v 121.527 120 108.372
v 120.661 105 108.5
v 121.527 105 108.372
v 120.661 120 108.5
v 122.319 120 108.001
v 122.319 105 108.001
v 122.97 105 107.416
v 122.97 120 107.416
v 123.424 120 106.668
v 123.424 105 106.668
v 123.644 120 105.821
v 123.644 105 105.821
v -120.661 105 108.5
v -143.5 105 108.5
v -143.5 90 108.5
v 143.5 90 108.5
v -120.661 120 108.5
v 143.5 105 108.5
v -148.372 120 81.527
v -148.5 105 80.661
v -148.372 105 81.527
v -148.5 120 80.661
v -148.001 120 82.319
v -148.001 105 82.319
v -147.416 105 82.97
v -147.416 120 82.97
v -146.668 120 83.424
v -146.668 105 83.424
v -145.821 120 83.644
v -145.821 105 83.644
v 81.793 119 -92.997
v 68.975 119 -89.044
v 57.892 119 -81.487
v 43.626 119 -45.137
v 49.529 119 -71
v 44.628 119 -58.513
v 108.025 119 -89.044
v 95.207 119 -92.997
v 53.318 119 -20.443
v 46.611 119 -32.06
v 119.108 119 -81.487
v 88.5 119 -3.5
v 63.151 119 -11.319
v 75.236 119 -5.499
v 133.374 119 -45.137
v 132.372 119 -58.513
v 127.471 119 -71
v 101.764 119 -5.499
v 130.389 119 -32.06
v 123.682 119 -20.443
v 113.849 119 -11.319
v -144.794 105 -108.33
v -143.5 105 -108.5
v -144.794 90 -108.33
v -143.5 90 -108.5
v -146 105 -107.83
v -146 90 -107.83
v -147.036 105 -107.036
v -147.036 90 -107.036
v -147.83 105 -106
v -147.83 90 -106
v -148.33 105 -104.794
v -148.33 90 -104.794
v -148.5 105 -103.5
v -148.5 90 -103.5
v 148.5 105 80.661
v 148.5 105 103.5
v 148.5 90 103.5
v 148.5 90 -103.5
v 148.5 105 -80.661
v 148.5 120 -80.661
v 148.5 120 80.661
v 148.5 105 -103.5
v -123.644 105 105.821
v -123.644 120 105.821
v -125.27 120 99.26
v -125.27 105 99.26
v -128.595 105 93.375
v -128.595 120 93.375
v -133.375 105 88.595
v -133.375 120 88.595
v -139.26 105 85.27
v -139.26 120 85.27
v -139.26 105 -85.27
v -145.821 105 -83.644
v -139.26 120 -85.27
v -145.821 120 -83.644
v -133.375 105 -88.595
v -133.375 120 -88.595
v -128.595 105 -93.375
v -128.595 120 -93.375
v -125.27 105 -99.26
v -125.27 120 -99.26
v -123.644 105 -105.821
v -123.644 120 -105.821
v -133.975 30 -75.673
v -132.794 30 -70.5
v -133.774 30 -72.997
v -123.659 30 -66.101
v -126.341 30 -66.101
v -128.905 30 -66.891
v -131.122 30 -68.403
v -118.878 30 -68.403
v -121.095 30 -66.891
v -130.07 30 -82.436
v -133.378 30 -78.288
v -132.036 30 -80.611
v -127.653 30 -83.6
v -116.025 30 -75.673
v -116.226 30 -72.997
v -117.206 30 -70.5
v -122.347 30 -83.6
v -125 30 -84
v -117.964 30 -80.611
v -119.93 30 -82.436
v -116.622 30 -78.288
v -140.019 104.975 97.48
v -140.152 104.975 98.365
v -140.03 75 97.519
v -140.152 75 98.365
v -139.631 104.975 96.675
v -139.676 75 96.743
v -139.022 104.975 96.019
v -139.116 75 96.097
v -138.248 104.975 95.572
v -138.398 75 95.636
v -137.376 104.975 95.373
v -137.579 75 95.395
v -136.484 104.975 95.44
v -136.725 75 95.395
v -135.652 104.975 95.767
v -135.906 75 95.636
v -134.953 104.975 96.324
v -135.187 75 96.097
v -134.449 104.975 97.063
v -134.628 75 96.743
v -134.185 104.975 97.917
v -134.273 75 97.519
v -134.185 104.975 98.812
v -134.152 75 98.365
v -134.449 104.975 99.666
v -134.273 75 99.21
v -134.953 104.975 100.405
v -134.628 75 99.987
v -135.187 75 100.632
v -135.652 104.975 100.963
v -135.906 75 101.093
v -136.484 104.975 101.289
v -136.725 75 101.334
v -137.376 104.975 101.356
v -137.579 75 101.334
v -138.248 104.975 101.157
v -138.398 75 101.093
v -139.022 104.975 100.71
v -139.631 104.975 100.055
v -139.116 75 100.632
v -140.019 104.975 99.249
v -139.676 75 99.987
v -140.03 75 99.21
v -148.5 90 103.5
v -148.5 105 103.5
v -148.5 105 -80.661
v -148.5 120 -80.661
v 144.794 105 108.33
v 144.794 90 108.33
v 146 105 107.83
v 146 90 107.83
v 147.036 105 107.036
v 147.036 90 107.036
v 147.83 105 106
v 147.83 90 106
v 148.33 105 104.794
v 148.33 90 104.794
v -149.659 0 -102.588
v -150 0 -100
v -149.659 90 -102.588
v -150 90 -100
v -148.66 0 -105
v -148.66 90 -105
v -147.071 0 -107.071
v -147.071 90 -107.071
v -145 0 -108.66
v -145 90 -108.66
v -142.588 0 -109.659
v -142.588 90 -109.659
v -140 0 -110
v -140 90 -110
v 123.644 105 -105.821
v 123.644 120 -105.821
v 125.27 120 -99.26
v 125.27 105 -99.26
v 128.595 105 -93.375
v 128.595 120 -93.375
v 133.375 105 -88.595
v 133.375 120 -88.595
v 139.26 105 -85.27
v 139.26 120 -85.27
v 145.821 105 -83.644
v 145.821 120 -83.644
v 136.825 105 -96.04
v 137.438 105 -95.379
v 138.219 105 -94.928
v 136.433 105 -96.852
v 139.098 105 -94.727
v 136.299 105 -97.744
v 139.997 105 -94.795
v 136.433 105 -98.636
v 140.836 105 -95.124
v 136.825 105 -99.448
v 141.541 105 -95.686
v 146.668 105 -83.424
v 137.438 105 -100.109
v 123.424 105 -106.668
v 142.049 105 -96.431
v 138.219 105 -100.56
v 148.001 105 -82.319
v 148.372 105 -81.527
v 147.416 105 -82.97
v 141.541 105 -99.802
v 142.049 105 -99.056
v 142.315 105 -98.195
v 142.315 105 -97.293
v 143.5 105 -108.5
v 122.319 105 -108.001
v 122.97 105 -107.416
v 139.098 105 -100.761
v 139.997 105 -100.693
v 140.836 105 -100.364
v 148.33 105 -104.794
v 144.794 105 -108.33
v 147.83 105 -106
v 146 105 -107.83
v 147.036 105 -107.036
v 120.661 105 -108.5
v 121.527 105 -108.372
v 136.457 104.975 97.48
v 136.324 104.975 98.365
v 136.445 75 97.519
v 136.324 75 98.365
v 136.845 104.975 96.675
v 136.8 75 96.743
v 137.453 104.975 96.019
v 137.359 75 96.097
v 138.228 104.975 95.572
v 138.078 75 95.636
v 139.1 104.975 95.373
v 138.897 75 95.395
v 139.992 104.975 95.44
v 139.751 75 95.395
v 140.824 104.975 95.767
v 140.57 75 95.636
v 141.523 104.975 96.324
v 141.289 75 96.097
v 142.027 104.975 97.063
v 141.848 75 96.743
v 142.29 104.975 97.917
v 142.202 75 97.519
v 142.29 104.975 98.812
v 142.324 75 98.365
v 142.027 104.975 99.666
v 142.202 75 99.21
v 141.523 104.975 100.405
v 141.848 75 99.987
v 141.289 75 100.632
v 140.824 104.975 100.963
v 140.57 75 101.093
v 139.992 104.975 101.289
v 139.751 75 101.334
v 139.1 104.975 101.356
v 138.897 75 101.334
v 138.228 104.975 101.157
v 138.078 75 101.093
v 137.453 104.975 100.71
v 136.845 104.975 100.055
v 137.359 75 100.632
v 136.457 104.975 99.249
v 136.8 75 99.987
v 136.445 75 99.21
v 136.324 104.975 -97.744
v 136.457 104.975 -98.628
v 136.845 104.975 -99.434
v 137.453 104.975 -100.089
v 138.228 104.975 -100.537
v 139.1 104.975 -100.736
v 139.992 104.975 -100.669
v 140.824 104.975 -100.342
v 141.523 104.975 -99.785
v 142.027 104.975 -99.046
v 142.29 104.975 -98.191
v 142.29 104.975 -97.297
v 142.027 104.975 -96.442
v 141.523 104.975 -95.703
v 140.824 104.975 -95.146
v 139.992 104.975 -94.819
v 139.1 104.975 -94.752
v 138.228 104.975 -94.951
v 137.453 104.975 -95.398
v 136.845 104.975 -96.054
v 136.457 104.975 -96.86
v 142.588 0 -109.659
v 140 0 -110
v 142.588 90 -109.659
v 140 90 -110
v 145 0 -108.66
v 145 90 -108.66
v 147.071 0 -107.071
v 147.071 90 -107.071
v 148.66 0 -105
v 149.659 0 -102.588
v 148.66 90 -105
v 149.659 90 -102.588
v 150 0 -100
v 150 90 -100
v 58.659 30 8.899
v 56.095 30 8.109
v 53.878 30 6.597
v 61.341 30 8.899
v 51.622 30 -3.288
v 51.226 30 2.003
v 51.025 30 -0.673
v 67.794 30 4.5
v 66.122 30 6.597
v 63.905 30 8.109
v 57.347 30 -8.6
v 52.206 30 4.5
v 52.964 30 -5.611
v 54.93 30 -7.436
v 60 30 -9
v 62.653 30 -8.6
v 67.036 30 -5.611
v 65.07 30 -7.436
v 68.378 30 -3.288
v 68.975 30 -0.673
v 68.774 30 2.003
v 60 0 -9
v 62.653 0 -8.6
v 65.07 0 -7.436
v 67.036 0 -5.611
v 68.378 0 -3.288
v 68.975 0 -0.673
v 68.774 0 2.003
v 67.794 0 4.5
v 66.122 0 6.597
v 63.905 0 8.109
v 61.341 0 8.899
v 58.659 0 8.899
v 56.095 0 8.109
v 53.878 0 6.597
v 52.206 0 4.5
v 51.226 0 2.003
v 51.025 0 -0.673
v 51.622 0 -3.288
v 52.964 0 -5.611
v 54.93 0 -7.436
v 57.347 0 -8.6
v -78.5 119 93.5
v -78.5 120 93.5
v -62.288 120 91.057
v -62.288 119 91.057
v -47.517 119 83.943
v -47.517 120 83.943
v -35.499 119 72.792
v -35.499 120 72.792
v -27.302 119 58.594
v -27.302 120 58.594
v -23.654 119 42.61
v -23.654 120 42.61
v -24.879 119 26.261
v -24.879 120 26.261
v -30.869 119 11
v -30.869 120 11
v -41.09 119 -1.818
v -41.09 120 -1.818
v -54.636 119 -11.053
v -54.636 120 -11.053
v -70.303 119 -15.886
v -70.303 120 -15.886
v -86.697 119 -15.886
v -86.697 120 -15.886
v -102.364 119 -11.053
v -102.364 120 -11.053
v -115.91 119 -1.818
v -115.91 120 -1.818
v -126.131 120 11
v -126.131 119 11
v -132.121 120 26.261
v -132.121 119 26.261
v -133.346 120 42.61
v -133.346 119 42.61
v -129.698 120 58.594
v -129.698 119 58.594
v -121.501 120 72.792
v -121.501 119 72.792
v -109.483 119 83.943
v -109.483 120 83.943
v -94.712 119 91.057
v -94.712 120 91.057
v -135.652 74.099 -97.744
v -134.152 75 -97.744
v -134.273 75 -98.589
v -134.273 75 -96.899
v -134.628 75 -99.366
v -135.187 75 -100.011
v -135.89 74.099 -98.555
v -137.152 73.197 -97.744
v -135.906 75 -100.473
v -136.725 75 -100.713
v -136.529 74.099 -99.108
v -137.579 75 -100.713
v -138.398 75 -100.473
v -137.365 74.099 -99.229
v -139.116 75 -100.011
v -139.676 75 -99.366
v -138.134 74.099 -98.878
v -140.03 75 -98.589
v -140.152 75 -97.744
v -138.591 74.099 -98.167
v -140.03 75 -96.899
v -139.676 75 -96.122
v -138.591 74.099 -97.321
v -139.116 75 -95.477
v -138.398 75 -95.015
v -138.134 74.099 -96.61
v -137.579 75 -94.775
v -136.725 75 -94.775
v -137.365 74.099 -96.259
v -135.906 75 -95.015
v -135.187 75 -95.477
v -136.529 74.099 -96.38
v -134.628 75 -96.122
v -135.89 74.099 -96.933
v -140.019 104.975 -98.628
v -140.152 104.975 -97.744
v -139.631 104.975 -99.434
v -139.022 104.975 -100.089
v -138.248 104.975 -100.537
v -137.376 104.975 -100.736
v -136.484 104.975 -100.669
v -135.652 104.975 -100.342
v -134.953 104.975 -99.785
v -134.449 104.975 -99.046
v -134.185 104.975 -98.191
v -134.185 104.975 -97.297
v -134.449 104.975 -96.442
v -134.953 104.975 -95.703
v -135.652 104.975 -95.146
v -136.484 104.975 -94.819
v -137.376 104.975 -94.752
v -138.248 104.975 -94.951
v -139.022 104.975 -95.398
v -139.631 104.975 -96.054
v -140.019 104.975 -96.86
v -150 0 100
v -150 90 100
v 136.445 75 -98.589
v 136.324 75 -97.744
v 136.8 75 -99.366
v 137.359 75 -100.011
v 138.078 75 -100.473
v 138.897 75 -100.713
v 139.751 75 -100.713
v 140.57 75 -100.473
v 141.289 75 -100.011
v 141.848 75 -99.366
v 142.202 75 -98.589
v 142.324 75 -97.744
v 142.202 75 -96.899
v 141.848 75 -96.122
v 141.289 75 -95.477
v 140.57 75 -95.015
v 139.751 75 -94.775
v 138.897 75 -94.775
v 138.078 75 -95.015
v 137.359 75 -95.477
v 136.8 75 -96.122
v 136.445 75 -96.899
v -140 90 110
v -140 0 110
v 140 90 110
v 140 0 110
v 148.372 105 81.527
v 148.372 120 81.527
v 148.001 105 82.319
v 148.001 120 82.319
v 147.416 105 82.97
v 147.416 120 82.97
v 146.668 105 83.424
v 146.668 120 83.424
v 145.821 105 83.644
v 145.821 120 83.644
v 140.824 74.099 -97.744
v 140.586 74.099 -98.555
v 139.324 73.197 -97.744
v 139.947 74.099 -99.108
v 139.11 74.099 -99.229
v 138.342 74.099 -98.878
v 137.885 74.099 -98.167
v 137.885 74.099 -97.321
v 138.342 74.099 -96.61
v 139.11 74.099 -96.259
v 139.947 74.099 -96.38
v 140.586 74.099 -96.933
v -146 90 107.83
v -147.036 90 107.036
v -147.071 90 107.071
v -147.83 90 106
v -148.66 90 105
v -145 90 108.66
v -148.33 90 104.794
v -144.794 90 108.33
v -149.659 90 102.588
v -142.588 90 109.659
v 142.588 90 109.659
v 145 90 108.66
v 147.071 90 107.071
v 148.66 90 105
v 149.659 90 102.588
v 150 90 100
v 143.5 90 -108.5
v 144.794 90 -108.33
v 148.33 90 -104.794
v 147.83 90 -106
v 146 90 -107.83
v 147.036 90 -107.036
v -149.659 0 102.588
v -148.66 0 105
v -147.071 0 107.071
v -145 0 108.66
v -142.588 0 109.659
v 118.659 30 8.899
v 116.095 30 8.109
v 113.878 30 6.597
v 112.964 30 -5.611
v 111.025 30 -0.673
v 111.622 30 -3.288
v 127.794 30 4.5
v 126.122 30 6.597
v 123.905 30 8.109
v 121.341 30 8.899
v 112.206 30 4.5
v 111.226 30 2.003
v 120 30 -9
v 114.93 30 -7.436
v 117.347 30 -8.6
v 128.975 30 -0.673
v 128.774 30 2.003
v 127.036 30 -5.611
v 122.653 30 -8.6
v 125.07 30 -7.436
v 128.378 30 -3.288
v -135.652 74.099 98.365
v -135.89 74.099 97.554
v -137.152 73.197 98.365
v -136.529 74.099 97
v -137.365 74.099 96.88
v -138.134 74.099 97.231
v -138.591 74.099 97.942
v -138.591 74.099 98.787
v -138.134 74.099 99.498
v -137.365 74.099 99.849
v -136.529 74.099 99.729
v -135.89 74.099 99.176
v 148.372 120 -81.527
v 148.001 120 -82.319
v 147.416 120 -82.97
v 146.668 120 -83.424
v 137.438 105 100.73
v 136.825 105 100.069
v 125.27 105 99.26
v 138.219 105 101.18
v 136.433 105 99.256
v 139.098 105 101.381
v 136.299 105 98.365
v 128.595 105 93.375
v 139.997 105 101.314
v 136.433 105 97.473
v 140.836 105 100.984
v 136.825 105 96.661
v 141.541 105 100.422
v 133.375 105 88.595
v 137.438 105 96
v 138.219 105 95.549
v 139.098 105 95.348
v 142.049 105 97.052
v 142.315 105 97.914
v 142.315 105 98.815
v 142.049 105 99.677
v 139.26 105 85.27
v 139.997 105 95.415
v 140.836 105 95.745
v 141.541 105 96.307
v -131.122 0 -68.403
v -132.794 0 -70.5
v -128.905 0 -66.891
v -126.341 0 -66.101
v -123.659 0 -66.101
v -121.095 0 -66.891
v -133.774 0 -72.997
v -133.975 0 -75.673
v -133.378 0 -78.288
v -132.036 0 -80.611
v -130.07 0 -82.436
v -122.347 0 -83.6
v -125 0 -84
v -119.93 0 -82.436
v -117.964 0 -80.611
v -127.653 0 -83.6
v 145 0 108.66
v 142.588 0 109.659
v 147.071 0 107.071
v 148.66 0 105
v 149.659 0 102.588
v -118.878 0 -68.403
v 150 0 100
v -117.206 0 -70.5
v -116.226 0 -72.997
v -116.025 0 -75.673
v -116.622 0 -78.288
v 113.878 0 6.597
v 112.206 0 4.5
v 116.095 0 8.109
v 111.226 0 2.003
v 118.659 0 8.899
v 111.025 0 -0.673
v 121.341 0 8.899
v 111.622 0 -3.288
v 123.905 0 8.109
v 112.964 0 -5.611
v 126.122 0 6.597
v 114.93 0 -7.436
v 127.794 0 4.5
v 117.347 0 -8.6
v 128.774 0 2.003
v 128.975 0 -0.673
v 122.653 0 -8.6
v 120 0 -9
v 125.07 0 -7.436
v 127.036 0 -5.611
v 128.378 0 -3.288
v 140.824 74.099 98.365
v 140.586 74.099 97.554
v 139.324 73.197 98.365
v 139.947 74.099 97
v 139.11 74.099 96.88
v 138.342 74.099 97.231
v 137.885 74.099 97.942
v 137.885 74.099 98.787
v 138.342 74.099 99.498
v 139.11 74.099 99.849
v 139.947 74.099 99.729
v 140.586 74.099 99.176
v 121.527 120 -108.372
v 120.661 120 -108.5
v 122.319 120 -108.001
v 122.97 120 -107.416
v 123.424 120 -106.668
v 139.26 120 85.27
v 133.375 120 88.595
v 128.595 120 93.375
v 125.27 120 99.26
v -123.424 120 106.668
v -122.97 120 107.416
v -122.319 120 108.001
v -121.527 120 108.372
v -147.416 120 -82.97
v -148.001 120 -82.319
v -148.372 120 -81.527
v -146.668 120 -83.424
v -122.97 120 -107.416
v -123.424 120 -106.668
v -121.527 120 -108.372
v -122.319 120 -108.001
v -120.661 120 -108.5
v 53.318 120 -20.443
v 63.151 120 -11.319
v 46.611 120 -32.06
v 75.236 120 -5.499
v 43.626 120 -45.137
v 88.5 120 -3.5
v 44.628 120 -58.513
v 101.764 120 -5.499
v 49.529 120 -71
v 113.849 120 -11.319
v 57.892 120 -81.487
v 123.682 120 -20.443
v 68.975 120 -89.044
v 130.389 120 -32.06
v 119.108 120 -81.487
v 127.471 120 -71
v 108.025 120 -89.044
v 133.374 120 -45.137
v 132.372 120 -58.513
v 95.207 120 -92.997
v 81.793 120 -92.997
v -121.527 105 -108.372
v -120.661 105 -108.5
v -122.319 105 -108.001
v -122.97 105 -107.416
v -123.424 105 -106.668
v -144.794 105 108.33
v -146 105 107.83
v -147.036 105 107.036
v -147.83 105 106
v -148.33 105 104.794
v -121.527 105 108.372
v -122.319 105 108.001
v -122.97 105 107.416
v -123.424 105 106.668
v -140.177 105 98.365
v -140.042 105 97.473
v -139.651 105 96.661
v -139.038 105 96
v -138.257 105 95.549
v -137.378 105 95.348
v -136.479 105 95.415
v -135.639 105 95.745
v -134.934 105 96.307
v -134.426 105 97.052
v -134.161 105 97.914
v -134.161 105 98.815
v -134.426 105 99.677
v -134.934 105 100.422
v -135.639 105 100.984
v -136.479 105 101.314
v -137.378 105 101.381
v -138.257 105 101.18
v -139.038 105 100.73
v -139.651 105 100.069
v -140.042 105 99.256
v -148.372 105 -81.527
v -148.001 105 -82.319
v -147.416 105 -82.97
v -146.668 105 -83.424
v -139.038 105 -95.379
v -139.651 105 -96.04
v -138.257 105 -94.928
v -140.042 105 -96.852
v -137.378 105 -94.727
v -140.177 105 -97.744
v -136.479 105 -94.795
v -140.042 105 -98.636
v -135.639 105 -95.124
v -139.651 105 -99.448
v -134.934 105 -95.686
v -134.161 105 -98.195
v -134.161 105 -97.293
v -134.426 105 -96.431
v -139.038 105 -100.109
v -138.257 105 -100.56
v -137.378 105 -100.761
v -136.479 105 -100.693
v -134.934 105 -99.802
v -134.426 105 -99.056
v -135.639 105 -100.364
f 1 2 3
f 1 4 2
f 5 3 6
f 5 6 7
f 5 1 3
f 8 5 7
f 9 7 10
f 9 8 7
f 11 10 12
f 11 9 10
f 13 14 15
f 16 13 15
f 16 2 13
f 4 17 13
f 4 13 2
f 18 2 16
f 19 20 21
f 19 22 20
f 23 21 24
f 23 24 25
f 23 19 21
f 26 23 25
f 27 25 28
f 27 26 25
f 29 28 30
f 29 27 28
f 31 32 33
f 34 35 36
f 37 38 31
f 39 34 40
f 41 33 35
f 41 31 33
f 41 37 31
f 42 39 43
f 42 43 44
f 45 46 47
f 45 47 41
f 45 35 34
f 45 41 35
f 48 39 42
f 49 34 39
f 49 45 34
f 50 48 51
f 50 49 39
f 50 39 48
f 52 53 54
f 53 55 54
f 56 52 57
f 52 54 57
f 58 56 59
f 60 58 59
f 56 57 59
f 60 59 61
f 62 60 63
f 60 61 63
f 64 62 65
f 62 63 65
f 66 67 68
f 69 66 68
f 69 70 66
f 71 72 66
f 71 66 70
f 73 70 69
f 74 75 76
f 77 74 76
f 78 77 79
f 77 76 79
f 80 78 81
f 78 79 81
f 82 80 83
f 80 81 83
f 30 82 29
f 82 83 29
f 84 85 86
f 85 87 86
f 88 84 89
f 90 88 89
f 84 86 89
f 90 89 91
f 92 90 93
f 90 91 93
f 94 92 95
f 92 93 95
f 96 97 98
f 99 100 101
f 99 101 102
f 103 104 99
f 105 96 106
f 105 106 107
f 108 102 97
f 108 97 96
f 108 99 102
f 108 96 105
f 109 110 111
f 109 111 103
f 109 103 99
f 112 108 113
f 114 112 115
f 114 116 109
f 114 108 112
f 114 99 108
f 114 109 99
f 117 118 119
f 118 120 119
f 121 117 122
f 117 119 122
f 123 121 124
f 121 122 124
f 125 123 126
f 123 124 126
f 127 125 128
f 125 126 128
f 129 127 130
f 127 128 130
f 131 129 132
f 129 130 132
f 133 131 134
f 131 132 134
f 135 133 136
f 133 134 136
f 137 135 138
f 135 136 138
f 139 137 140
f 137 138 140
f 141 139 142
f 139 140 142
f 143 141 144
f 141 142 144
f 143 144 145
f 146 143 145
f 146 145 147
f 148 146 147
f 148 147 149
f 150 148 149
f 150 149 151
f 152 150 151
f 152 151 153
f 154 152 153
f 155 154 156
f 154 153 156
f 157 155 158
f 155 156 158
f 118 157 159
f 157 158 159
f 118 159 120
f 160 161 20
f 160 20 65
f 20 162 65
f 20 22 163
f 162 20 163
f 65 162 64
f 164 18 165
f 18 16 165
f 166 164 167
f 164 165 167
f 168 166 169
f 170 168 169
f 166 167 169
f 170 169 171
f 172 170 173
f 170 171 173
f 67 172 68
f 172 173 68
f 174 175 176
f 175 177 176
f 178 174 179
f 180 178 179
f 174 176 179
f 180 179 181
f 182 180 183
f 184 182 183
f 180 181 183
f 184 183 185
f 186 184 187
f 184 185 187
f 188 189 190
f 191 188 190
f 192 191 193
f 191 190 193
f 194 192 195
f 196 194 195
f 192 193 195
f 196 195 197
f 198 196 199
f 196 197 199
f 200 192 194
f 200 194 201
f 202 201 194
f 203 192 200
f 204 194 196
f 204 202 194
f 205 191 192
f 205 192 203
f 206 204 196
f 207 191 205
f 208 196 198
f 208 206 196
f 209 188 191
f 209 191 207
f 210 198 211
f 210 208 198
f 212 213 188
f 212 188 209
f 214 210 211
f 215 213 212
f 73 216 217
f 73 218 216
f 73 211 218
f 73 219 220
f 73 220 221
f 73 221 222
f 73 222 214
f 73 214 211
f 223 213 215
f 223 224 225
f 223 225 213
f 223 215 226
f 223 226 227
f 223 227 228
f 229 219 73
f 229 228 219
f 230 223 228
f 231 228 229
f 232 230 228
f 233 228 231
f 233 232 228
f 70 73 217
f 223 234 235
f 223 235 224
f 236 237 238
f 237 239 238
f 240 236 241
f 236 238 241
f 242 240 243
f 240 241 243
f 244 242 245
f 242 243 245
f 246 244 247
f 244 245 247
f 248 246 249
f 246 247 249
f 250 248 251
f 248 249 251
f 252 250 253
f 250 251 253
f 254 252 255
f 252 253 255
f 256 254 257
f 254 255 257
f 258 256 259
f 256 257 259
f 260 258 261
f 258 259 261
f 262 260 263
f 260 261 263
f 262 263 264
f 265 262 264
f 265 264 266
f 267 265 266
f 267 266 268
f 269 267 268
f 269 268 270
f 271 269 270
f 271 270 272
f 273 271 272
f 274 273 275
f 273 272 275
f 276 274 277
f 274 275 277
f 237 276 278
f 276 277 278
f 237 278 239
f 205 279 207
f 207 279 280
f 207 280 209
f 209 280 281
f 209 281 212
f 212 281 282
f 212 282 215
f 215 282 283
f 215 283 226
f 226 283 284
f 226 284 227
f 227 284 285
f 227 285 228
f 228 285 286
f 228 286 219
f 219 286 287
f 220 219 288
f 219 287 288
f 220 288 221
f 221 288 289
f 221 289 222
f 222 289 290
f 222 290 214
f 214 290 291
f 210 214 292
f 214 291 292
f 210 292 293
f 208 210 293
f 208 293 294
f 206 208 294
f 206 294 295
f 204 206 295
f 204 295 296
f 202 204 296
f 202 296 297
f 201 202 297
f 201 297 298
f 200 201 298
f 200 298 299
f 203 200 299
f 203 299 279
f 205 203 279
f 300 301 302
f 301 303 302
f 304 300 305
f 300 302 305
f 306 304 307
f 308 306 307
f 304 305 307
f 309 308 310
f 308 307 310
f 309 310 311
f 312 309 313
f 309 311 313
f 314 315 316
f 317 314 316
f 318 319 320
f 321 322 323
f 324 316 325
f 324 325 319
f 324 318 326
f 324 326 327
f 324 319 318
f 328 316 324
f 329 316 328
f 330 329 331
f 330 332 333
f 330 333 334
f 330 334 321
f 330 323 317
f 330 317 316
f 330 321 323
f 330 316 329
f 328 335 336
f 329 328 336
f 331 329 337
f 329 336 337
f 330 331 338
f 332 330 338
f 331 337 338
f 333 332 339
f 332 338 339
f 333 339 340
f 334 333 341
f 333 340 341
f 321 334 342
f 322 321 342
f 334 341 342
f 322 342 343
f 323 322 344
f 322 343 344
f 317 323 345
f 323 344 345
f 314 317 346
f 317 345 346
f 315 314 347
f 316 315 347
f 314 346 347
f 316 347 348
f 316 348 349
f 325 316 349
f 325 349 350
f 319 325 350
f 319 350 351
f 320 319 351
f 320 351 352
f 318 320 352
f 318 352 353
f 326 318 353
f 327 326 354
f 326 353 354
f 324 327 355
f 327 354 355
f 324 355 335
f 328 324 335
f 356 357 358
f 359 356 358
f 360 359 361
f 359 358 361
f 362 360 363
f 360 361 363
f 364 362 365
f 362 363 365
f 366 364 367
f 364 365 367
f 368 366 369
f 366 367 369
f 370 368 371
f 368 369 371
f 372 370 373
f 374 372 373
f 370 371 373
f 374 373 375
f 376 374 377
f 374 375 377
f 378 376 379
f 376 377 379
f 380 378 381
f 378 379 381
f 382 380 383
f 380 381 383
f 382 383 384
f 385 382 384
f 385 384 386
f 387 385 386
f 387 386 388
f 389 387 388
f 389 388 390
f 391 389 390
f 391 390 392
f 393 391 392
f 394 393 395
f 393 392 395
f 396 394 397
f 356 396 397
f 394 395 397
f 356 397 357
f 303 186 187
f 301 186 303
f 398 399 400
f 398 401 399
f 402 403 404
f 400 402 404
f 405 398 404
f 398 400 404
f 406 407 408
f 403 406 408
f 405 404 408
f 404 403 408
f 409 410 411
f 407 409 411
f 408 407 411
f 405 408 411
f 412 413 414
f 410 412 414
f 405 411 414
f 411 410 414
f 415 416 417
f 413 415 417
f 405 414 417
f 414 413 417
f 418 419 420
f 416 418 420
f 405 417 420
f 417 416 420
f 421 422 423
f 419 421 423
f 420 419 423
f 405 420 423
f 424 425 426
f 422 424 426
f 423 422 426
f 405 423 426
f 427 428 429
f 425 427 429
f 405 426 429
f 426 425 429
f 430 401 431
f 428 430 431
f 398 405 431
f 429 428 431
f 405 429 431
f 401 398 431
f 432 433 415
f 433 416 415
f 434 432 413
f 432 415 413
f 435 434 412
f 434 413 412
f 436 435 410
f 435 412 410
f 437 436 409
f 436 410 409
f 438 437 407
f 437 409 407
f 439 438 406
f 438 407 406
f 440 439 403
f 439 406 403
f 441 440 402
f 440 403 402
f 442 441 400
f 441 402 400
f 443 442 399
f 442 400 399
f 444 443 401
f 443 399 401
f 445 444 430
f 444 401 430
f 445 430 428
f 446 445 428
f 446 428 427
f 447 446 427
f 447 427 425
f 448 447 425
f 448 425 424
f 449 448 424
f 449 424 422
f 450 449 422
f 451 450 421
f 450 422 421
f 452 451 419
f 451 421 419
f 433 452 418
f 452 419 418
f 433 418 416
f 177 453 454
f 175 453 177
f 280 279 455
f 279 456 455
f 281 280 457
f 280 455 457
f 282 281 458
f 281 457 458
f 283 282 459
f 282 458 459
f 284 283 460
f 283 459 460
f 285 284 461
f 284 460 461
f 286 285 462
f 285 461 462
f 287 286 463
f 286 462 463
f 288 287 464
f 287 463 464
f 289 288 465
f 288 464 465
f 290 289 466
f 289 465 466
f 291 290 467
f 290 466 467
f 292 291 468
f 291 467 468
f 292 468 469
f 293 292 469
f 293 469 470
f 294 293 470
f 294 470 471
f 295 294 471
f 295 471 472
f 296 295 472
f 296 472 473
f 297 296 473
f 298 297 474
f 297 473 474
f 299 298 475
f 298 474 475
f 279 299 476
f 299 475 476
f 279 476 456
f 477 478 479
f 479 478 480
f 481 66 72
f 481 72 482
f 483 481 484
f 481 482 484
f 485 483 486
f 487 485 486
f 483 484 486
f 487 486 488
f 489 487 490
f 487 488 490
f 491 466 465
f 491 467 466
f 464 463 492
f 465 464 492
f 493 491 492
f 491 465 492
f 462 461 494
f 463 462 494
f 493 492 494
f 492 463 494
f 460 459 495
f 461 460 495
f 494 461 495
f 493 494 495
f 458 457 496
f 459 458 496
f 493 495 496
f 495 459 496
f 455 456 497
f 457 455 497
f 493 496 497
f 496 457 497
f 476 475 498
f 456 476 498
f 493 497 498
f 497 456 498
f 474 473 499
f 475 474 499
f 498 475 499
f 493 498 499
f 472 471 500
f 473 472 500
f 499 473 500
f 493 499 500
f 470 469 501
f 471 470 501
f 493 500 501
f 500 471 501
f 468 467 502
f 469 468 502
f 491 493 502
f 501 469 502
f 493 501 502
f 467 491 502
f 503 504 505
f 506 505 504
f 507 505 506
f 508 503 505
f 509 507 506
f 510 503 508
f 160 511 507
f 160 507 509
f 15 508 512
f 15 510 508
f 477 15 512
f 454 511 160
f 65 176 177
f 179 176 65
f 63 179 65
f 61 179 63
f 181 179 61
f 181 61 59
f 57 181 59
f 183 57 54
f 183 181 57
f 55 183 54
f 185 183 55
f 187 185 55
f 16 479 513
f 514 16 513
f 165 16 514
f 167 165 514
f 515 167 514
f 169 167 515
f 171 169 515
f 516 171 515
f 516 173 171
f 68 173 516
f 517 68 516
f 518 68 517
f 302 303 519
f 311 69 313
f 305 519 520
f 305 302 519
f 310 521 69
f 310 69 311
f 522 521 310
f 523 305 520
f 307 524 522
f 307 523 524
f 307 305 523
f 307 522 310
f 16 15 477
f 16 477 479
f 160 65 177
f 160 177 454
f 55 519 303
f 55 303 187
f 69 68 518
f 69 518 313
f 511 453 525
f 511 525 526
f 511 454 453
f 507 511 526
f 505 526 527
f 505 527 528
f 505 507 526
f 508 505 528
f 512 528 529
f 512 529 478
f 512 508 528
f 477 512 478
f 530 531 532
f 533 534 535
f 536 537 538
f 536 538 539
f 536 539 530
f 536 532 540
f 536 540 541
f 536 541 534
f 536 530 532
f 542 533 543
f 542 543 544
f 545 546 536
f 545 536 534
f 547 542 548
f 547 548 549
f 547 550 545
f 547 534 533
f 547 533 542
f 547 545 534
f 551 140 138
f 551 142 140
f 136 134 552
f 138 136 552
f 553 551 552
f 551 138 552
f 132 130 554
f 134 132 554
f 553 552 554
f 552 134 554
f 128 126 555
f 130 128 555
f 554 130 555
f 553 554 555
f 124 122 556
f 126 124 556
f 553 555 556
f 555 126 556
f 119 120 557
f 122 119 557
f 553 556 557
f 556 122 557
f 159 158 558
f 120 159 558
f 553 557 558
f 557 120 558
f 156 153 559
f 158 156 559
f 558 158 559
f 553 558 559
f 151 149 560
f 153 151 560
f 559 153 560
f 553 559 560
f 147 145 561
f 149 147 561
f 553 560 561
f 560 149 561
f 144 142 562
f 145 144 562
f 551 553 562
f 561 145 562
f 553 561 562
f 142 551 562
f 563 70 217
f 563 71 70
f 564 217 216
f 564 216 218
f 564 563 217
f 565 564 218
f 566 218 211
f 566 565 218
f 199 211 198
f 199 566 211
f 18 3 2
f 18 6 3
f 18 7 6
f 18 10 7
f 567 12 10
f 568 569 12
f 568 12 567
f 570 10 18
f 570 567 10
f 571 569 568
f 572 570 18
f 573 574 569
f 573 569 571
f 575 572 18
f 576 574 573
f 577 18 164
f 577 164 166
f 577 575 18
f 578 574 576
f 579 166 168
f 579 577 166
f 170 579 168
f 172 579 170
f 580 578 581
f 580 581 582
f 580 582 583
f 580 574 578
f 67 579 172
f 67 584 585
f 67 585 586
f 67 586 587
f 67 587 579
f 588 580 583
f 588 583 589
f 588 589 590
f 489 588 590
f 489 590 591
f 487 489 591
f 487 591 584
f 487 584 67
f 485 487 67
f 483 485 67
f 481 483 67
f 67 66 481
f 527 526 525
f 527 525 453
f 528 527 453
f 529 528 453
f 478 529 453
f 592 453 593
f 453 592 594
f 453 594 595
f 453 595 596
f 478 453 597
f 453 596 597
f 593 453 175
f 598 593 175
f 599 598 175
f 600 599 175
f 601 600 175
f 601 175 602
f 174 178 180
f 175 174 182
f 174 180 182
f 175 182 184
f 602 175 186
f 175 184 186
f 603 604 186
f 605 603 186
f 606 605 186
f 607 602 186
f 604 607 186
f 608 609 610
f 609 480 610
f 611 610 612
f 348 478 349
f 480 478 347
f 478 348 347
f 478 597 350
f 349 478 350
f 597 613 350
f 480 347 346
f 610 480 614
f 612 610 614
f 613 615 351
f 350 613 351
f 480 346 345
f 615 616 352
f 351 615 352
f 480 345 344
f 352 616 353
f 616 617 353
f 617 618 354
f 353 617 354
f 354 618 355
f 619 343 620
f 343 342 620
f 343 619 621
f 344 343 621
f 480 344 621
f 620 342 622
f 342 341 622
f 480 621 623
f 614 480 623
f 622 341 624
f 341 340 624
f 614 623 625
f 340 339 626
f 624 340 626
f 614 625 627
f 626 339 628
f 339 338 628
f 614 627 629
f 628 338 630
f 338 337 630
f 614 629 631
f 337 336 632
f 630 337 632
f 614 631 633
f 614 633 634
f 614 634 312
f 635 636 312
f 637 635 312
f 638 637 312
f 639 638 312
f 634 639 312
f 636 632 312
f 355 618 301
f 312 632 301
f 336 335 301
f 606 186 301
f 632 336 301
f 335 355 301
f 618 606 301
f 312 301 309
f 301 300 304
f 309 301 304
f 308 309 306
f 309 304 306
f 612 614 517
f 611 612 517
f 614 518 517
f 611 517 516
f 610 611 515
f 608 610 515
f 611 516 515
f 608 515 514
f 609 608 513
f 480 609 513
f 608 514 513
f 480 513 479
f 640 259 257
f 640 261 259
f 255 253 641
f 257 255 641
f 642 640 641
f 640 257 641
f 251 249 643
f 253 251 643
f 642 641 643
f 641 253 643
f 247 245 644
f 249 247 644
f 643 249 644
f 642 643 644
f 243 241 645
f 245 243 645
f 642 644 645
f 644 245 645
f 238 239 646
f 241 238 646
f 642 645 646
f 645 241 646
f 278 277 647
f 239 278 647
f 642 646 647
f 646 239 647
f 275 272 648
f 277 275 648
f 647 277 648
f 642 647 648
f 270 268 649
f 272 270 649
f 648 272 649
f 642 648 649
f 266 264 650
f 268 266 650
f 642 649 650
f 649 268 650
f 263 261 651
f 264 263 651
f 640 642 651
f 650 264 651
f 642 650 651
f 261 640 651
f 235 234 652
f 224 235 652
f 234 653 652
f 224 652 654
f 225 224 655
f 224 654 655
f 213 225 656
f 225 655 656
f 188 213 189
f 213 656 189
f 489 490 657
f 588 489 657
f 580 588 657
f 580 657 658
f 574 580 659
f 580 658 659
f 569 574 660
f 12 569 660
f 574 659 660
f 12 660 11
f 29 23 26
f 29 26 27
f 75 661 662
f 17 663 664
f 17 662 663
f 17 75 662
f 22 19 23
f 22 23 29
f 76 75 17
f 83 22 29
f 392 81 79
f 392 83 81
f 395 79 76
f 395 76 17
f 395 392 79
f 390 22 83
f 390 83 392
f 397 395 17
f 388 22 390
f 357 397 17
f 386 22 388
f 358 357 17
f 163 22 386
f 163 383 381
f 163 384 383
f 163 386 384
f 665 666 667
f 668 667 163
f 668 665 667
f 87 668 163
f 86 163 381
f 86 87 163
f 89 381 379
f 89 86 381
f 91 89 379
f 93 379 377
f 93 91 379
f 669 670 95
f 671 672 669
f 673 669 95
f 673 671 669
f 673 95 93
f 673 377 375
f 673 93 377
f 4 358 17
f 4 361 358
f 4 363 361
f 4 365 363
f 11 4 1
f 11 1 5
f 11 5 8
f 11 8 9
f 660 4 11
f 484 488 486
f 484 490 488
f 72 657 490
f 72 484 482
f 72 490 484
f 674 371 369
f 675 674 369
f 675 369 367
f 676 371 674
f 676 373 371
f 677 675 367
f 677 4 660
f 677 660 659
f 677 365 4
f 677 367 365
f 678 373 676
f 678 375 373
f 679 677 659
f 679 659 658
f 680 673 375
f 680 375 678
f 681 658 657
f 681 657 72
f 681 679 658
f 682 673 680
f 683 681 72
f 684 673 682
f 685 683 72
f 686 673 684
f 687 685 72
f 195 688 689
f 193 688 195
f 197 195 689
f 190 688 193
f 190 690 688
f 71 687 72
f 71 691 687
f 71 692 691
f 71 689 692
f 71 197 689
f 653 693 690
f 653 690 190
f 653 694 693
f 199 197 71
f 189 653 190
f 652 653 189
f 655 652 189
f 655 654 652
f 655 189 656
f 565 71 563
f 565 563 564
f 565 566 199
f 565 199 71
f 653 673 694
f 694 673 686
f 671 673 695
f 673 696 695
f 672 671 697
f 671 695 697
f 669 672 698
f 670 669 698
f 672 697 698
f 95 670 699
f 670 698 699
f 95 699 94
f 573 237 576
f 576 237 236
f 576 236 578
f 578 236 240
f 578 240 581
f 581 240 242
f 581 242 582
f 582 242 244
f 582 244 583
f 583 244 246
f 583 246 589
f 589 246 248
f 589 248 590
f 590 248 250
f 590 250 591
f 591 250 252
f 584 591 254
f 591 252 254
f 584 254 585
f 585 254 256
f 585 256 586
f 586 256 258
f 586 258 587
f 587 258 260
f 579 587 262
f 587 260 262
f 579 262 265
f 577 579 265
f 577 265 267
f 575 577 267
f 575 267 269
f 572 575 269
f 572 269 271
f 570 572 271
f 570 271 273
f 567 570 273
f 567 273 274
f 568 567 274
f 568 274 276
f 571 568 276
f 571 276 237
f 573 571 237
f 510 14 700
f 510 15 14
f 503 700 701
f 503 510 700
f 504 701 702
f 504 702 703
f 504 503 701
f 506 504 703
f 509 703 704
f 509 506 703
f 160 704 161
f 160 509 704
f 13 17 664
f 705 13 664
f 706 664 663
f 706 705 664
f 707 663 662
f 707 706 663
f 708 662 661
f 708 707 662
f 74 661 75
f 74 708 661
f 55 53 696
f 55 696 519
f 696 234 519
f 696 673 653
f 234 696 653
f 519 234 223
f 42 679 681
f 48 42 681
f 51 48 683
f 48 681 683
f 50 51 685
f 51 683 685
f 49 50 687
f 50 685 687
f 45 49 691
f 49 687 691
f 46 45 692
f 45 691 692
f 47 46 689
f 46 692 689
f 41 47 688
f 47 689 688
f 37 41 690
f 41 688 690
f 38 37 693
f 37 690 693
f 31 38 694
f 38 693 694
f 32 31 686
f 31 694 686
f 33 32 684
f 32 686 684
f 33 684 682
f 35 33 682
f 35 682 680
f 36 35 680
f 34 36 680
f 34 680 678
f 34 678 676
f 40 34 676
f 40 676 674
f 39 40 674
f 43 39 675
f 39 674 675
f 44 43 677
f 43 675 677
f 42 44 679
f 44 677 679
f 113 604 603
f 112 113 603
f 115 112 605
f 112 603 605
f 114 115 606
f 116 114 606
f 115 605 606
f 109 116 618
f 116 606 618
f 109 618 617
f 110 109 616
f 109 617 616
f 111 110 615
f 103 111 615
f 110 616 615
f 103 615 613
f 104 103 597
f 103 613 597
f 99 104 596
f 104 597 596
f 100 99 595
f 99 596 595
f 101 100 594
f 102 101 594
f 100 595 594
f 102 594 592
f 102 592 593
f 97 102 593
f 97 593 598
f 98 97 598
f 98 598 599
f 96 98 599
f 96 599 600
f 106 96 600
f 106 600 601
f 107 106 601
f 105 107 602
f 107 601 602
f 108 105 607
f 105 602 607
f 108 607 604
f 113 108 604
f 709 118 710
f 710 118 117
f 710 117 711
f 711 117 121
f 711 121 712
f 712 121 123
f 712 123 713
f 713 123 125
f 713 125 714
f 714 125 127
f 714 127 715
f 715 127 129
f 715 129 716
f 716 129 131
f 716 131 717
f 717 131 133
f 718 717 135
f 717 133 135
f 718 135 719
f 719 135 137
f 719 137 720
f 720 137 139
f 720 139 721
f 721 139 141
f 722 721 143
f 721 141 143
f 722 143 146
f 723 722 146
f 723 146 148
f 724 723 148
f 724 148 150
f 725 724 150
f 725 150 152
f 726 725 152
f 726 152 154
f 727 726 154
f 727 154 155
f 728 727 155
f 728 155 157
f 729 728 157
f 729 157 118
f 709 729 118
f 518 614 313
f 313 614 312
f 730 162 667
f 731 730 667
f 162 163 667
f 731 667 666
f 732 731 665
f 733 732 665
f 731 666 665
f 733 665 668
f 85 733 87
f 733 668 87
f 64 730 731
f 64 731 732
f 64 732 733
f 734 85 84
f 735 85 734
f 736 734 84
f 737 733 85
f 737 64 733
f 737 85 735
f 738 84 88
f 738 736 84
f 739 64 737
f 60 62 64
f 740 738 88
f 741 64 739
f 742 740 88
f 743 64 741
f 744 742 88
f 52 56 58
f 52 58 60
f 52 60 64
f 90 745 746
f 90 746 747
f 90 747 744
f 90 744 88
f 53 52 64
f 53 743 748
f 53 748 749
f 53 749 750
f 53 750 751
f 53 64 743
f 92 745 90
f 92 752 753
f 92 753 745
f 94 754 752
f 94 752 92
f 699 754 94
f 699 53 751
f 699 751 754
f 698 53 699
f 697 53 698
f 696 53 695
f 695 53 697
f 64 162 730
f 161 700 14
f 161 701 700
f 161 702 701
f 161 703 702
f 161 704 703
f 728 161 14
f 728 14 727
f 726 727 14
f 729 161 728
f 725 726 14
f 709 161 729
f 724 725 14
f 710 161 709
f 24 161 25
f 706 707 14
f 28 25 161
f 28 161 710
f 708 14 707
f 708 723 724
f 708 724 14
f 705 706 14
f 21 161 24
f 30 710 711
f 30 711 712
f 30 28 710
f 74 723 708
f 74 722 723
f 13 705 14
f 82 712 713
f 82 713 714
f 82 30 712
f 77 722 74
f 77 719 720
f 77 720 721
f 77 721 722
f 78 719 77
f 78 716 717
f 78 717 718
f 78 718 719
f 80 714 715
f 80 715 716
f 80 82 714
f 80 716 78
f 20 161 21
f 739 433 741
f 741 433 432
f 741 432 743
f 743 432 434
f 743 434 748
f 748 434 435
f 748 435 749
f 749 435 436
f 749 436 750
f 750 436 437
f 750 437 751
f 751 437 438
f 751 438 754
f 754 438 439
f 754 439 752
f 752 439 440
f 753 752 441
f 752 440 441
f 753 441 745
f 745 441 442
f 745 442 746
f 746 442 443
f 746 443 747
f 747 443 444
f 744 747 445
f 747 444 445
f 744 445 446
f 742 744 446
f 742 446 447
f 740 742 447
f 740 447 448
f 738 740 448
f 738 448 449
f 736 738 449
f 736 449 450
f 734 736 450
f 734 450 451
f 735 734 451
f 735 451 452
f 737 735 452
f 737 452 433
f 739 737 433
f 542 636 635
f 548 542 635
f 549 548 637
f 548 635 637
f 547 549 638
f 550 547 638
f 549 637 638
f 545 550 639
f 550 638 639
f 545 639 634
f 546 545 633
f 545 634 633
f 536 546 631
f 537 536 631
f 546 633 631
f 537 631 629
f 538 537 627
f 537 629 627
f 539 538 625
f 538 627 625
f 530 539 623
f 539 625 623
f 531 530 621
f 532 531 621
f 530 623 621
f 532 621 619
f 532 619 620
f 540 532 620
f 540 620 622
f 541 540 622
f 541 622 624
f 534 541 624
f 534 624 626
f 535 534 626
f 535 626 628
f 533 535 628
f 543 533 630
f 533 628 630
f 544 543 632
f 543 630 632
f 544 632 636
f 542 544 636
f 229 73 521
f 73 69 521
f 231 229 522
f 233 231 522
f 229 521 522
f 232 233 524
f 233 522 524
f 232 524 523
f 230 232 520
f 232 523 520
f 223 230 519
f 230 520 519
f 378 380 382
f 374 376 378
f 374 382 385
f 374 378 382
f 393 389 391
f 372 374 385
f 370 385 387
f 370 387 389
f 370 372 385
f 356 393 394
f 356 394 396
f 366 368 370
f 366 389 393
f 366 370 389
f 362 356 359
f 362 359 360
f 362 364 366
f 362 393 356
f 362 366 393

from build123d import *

# Parameters (mm, degrees)
SKETCH1_W                       = 300
SKETCH1_H                       = 220
BOSS_EXTRUDE1_DEPTH             = 120
SKETCH3_OUTSIDE_W               = 380.18
SKETCH3_OUTSIDE_H               = 300.18
SKETCH3_OUTSIDE_W_2             = 297
SKETCH3_OUTSIDE_H_2             = 217
CUT_EXTRUDE3_DEPTH              = 30
SKETCH4_R                       = 25
CUT_EXTRUDE4_DEPTH              = 15
FILLET1_R                       = 3
FILLET2_R                       = 5
FILLET3_R                       = 10
F_6_0MM_DOWEL_HOLE1_D           = 6
F_6_0MM_DOWEL_HOLE1_DEPTH       = 30
F_6_0MM_DOWEL_HOLE1_CSINK_D     = 6.05
F_6_0MM_DOWEL_HOLE1_CSINK_ANGLE = 90
F_6_0MM_DOWEL_HOLE1_TIP         = 1.802581857
SKETCH10_R                      = 55
SKETCH10_R_2                    = 45
CUT_EXTRUDE5_DEPTH              = 1
SKETCH11_R                      = 9
CUT_EXTRUDE6_DEPTH              = 30


with BuildPart() as part:
    # Sketch1 → Boss-Extrude1 (new body)
    with BuildSketch(Plane(origin=(0, 0, 0), x_dir=(1, 0, 0), z_dir=(0, 1, 0))):
        Rectangle(SKETCH1_W, SKETCH1_H)
    extrude(amount=BOSS_EXTRUDE1_DEPTH)

    # Sketch3 outside → Cut-Extrude3 (cut)
    with BuildSketch(Plane(origin=(0, 120, 0), x_dir=(1, 0, 0), z_dir=(0, 1, 0))):
        Rectangle(SKETCH3_OUTSIDE_W, SKETCH3_OUTSIDE_H)
        Rectangle(SKETCH3_OUTSIDE_W_2, SKETCH3_OUTSIDE_H_2, mode=Mode.SUBTRACT)
    extrude(amount=-CUT_EXTRUDE3_DEPTH, mode=Mode.SUBTRACT)

    # Sketch4 → Cut-Extrude4 (cut)
    with BuildSketch(Plane(origin=(0, 120, 0), x_dir=(1, 0, 0), z_dir=(0, 1, 0))):
        with Locations((-148.5, -108.5)):
            Circle(SKETCH4_R)
        with Locations((-148.5, 108.5)):
            Circle(SKETCH4_R)
        with Locations((148.5, 108.5)):
            Circle(SKETCH4_R)
        with Locations((148.5, -108.5)):
            Circle(SKETCH4_R)
    extrude(amount=-CUT_EXTRUDE4_DEPTH, mode=Mode.SUBTRACT)

    # Fillet1
    fillet1_edges = [part.edges().sort_by_distance(p)[0] for p in [
        (148.5, 112.5, 83.5),
        (123.5, 112.5, 108.5),
        (123.5, 112.5, -108.5),
        (148.5, 112.5, -83.5),
        (-123.5, 112.5, -108.5),
        (-148.5, 112.5, -83.5),
        (-123.5, 112.5, 108.5),
        (-148.5, 112.5, 83.5),
    ]]
    fillet(fillet1_edges, radius=FILLET1_R)

    # Fillet2
    fillet2_edges = [part.edges().sort_by_distance(p)[0] for p in [
        (148.5, 97.5, -108.5),
        (148.5, 97.5, 108.5),
        (-148.5, 97.5, 108.5),
        (-148.5, 97.5, -108.5),
    ]]
    fillet(fillet2_edges, radius=FILLET2_R)

    # Fillet3
    fillet3_edges = [part.edges().sort_by_distance(p)[0] for p in [
        (-150, 45, -110),
        (150, 45, -110),
        (150, 45, 110),
        (-150, 45, 110),
    ]]
    fillet(fillet3_edges, radius=FILLET3_R)

    # Ø6.0mm Dowel Hole1
    with Locations(Plane(origin=(0, 105, 0), x_dir=(1, 0, 0), z_dir=(0, 1, 0))):
        with Locations((-137.151874048, 97.743982636), (-137.151874048, -98.364579351), (139.323962551, -98.364579351), (139.323962551, 97.743982636)):
            CounterSinkHole(F_6_0MM_DOWEL_HOLE1_D / 2, F_6_0MM_DOWEL_HOLE1_CSINK_D / 2, depth=F_6_0MM_DOWEL_HOLE1_DEPTH, counter_sink_angle=F_6_0MM_DOWEL_HOLE1_CSINK_ANGLE)
            with Locations((0, 0, -(F_6_0MM_DOWEL_HOLE1_DEPTH + F_6_0MM_DOWEL_HOLE1_TIP / 2))):  # 118° drill point
                Cone(0, F_6_0MM_DOWEL_HOLE1_D / 2, F_6_0MM_DOWEL_HOLE1_TIP, mode=Mode.SUBTRACT)

    # Sketch10 → Cut-Extrude5 (cut)
    with BuildSketch(Plane(origin=(0, 120, 0), x_dir=(1, 0, 0), z_dir=(0, 1, 0))):
        with Locations(Location((-78.5, -38.5, 0), (0, 0, 270))):
            Circle(SKETCH10_R)
        with Locations(Location((88.5, 48.5, 0), (0, 0, 270))):
            Circle(SKETCH10_R_2)
    extrude(amount=-CUT_EXTRUDE5_DEPTH, mode=Mode.SUBTRACT)

    # Sketch11 → Cut-Extrude6 (cut)
    with BuildSketch(Plane.XZ):
        with Locations(Location((120, 0, 0), (0, 0, 270))):
            Circle(SKETCH11_R)
        with Locations(Location((60, 0, 0), (0, 0, 270))):
            Circle(SKETCH11_R)
        with Locations(Location((-125, -75, 0), (0, 0, 270))):
            Circle(SKETCH11_R)
    extrude(amount=-CUT_EXTRUDE6_DEPTH, mode=Mode.SUBTRACT)


solid = part.part
